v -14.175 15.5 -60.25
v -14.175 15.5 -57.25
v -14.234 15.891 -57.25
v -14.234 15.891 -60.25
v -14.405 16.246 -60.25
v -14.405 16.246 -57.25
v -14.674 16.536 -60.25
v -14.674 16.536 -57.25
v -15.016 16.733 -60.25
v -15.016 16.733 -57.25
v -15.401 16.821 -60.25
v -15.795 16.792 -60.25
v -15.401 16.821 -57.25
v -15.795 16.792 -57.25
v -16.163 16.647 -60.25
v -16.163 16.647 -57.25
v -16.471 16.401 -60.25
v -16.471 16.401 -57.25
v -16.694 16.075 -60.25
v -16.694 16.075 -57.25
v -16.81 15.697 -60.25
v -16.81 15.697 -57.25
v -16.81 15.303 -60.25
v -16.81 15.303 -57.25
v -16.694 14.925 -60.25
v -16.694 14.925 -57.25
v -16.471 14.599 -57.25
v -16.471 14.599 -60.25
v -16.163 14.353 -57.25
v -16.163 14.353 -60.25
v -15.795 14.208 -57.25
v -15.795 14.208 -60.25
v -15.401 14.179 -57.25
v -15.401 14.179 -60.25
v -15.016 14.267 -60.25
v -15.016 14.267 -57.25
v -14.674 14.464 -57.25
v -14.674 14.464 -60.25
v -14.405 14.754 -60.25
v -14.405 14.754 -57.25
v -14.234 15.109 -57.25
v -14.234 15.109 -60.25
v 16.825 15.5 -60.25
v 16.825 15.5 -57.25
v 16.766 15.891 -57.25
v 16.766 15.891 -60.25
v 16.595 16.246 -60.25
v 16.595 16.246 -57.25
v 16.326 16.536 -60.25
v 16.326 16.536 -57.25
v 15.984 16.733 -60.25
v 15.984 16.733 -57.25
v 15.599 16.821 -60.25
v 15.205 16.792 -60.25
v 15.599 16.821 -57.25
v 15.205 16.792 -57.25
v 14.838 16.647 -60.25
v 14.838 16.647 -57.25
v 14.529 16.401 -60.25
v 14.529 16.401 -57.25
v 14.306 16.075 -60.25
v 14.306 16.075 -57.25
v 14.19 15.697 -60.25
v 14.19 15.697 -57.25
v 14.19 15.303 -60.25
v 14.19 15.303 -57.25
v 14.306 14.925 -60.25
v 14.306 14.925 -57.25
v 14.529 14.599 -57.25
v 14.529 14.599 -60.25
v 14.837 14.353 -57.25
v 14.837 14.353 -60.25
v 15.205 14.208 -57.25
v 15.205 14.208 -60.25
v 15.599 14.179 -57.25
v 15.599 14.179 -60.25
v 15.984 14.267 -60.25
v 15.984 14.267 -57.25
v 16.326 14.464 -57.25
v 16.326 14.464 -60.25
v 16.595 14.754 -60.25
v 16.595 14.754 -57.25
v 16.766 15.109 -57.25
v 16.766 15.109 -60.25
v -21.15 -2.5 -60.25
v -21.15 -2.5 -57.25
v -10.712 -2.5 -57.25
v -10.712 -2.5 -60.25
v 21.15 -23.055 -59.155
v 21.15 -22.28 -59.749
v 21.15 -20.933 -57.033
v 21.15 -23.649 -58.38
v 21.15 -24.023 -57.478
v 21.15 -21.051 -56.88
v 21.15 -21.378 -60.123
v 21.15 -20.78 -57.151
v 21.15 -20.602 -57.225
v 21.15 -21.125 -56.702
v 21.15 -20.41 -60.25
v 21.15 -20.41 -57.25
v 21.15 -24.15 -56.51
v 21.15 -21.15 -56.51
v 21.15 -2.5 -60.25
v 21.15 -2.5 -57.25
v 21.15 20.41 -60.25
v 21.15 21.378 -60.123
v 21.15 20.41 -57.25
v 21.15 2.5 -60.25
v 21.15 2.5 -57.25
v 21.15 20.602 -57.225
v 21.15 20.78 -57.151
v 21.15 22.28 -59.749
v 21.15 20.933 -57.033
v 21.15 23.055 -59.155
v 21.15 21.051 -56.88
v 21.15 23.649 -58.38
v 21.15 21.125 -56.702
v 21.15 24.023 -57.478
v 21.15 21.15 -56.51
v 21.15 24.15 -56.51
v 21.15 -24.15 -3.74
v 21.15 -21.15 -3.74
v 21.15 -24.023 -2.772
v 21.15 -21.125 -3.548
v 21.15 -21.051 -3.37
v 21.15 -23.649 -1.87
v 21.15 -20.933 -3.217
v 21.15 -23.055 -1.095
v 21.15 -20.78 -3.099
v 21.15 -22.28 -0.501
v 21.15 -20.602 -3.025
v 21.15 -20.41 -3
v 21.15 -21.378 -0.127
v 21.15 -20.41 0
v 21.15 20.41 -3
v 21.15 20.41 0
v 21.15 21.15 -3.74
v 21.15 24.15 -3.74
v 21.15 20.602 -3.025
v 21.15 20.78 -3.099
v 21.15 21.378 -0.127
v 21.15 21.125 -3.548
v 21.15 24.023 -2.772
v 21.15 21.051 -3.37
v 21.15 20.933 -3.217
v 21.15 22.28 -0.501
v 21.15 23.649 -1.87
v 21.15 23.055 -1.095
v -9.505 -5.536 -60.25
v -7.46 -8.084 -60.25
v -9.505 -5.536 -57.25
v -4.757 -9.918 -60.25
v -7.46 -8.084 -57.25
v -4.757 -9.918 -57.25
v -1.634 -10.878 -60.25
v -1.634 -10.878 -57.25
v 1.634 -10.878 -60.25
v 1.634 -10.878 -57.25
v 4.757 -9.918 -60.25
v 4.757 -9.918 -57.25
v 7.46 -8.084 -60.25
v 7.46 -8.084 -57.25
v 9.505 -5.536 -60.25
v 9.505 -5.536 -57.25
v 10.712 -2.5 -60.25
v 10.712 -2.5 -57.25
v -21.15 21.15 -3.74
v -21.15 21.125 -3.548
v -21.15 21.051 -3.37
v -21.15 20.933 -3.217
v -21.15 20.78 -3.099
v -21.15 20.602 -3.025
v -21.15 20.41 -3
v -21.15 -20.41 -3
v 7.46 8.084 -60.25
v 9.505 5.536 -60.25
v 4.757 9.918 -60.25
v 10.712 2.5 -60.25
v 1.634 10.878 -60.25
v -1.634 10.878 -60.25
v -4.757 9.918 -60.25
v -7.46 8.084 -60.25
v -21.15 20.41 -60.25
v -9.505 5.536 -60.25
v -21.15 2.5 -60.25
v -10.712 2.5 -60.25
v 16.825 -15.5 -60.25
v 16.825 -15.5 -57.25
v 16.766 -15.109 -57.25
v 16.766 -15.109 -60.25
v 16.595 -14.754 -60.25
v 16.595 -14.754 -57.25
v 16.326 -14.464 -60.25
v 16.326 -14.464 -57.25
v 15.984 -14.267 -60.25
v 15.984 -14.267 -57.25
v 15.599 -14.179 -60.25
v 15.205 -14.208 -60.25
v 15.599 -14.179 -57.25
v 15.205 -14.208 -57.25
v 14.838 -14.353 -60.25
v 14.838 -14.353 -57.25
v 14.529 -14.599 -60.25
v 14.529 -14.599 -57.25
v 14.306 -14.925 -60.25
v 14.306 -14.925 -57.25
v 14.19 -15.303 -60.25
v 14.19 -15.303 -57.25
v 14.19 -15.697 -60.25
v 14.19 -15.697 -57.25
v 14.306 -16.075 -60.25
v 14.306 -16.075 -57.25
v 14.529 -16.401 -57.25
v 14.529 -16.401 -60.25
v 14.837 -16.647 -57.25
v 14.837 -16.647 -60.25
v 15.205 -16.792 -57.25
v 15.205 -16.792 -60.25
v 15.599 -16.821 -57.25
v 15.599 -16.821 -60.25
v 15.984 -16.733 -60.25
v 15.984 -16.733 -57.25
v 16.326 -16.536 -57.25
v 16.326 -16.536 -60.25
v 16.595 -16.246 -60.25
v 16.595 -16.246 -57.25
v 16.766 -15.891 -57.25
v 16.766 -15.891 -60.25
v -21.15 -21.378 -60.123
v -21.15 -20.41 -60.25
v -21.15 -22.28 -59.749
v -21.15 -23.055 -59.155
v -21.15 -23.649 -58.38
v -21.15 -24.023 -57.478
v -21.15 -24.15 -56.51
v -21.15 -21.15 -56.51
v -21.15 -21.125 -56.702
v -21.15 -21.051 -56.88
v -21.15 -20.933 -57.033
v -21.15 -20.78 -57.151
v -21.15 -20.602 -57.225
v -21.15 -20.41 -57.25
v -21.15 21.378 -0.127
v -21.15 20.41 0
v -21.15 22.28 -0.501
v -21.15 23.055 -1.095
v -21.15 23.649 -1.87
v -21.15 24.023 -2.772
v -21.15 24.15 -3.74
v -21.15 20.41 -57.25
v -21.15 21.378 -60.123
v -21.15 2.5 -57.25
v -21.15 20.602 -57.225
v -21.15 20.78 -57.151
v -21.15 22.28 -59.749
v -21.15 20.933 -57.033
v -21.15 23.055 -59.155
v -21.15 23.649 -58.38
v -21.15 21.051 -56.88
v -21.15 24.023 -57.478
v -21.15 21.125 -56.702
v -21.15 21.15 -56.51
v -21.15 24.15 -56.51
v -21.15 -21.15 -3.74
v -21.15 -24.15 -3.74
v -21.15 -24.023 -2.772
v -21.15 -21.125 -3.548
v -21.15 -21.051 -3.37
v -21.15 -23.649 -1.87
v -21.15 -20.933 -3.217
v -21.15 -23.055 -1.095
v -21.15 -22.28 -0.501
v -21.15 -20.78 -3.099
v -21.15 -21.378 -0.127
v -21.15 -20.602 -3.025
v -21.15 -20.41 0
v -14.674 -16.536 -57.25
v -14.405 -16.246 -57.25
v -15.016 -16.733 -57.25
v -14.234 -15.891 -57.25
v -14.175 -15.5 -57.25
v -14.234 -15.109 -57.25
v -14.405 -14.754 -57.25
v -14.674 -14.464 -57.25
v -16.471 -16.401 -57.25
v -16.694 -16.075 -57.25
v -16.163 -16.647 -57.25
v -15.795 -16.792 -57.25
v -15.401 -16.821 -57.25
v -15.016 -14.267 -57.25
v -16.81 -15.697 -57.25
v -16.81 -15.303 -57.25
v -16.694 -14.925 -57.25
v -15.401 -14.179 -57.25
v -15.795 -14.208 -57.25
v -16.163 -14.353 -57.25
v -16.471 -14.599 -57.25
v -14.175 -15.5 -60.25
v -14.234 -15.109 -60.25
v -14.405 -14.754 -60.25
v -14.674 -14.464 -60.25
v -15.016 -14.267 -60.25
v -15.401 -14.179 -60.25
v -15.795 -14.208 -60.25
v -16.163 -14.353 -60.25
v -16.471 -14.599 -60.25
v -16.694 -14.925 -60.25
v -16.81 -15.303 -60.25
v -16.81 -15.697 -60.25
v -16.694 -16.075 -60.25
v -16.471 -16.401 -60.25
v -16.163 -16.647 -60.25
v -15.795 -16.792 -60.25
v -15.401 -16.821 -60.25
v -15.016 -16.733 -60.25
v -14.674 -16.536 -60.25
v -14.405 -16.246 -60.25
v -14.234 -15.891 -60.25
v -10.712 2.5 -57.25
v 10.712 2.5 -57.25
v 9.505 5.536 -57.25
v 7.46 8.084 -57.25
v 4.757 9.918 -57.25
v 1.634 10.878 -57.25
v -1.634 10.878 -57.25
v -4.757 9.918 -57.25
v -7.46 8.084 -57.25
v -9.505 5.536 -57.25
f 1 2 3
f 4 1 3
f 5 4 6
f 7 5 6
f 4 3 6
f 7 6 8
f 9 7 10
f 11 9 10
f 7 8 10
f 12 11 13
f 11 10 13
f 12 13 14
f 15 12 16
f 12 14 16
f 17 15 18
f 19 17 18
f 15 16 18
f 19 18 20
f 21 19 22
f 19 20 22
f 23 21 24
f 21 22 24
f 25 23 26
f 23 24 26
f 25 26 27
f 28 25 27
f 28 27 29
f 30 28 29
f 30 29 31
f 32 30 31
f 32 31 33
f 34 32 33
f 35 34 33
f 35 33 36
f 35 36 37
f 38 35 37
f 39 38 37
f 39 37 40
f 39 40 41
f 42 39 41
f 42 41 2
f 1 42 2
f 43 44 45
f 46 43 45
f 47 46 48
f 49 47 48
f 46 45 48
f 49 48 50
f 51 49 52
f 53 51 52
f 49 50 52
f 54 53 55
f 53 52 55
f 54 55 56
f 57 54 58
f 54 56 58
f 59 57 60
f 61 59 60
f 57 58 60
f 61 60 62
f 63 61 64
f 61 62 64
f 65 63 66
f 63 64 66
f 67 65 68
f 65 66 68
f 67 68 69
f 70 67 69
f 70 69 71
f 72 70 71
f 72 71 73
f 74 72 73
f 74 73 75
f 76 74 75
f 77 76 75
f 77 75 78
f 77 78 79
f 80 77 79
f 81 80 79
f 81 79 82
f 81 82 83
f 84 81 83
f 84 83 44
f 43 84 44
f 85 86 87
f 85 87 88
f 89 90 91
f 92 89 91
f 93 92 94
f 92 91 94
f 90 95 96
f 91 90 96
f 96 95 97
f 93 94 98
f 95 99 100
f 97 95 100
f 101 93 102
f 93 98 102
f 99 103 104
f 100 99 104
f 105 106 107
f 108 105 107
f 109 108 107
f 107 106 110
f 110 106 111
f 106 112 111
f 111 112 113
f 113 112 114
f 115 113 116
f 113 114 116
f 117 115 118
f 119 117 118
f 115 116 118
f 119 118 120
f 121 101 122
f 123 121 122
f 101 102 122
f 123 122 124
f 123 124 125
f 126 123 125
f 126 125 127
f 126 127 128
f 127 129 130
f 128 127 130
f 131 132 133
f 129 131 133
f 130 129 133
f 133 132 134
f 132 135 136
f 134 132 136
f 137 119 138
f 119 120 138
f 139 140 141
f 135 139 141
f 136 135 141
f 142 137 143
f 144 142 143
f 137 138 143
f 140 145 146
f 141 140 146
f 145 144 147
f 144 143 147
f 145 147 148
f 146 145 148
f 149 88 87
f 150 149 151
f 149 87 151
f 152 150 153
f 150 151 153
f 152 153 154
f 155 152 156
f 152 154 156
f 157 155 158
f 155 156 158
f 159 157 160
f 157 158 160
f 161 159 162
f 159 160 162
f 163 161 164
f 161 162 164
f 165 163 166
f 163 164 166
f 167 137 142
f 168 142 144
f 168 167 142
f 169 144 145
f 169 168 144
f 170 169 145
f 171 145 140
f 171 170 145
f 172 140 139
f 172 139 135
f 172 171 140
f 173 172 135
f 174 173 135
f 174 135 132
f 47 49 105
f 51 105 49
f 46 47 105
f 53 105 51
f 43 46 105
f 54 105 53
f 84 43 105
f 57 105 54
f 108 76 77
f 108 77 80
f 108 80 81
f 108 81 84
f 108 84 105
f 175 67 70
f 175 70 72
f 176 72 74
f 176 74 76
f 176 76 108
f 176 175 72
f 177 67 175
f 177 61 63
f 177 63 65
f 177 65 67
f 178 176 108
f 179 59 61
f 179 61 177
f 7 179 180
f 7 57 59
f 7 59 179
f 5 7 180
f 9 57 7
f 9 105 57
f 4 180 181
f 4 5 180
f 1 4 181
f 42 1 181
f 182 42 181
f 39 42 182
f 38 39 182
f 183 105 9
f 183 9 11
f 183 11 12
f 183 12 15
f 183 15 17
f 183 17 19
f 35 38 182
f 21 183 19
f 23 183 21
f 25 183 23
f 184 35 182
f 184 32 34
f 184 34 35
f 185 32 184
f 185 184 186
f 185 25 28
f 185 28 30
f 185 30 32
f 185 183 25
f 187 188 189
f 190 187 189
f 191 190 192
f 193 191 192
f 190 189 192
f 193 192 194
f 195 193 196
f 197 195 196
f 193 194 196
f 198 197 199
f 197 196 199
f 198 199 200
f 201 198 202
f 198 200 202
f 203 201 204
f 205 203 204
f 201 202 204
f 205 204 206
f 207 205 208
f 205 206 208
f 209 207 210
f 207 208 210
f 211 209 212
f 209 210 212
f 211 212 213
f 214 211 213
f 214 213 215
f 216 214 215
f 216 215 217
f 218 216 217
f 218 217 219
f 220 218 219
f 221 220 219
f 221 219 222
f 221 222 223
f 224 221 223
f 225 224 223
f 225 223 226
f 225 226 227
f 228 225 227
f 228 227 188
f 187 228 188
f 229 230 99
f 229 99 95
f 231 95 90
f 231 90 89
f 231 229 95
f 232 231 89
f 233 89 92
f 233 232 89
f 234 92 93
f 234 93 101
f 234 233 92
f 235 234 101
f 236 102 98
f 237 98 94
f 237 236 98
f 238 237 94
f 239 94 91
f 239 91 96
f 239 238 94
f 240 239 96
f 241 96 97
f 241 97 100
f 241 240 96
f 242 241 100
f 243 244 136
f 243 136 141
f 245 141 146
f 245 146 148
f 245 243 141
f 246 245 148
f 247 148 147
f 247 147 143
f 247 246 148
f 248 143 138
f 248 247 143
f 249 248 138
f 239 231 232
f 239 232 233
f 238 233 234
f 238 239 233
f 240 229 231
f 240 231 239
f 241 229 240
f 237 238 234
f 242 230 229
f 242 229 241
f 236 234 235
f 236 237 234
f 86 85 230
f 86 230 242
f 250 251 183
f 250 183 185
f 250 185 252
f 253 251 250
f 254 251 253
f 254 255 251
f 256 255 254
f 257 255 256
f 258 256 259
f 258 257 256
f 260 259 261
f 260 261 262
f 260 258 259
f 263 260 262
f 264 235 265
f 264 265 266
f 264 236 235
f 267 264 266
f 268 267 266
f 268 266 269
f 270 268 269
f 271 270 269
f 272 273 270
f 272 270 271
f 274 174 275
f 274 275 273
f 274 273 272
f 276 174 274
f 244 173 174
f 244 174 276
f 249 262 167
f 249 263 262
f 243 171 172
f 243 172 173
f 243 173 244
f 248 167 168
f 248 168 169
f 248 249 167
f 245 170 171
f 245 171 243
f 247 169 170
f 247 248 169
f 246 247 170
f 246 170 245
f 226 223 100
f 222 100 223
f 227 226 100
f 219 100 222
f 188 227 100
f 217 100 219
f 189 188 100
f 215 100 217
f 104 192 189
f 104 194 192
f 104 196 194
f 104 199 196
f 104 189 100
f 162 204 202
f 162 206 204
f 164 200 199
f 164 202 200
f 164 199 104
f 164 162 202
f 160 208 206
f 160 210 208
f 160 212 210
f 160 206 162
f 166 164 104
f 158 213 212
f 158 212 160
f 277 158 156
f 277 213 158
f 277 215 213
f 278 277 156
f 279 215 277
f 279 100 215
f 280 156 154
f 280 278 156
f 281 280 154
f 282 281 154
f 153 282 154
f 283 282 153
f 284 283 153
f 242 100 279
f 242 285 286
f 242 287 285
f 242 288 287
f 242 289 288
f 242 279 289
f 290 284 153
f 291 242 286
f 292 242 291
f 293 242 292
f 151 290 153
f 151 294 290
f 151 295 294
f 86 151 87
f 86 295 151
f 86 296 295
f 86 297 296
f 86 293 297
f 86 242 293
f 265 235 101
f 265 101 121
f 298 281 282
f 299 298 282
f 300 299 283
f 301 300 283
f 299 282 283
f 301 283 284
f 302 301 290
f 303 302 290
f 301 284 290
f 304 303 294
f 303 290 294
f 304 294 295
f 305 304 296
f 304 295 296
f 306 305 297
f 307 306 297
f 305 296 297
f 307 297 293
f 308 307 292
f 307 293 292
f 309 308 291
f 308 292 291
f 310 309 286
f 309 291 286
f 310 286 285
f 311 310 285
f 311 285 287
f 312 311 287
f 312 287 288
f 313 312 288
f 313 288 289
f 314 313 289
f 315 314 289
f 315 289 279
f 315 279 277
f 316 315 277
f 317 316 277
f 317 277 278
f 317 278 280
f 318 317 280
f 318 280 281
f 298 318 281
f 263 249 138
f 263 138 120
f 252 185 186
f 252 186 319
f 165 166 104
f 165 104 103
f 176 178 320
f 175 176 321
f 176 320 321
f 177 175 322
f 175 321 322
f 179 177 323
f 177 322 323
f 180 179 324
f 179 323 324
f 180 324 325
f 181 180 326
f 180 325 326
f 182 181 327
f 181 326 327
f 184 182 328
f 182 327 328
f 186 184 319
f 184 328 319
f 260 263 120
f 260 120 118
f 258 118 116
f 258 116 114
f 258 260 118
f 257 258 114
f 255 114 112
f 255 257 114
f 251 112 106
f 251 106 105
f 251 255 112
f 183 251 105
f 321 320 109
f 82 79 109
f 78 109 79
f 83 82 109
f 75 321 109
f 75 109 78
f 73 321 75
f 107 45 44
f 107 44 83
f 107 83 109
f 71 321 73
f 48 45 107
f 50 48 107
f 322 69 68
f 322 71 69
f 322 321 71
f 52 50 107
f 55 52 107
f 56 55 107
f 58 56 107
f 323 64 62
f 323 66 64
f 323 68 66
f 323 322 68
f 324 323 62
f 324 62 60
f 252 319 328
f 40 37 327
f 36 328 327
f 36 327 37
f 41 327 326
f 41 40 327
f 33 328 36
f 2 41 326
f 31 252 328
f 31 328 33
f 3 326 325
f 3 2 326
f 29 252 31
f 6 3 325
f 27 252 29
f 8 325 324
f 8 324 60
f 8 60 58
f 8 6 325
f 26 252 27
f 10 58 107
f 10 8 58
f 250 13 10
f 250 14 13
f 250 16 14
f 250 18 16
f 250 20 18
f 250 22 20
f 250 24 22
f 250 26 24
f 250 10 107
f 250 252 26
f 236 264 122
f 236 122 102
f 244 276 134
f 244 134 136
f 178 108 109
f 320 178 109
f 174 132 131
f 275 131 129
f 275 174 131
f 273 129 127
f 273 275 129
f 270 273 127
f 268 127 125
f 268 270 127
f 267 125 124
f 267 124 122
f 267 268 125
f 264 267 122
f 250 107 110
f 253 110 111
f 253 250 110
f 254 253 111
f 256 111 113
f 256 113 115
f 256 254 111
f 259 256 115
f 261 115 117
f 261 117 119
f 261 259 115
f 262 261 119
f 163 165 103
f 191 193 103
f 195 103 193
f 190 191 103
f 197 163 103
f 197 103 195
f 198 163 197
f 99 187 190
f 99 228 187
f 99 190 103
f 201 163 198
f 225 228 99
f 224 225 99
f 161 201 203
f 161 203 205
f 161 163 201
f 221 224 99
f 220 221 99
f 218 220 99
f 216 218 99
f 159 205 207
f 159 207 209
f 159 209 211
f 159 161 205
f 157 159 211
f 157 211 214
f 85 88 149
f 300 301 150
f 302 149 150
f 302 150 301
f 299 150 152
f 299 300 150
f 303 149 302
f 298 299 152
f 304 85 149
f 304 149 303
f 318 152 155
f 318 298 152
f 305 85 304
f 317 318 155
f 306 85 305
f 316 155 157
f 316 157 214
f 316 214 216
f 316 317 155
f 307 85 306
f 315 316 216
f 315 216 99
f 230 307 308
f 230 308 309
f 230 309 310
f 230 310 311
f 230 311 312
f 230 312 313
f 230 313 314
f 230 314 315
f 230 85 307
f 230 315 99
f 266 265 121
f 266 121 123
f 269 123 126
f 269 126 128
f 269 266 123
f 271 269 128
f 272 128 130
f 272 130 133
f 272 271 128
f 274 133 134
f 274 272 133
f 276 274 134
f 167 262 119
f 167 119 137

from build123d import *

# Parameters (mm, degrees)
SM_START               = -21.15
SM_BASE_FLANGE_2_DEPTH = 42.3
SKETCH_11_R            = 1.325
SKETCH_11_R_2          = 11
CUT_EXTRUDE_1_DEPTH    = 66.636175239


# Sheet-metal steps are written as plain solids
with BuildPart() as part:
    # Эскиз6 → Базовая кромка2 (new body)
    with BuildSketch(Plane(origin=(0, 0, 0), x_dir=(0, 0, -1), z_dir=(1, 0, 0)).offset(SM_START)):
        with BuildLine():
            Line((57.25, 2.5), (57.25, 20.41))
            ThreePointArc((57.25, 20.41), (57.033259018, 20.933259018), (56.51, 21.15))
            Line((56.51, 21.15), (3.74, 21.15))
            ThreePointArc((3.74, 21.15), (3.216740982, 20.933259018), (3, 20.41))
            Line((3, 20.41), (3, -20.41))
            ThreePointArc((3, -20.41), (3.216740982, -20.933259018), (3.74, -21.15))
            Line((3.74, -21.15), (56.51, -21.15))
            ThreePointArc((56.51, -21.15), (57.033259018, -20.933259018), (57.25, -20.41))
            Line((57.25, -20.41), (57.25, -2.5))
            Line((57.25, -2.5), (60.25, -2.5))
            Line((60.25, -2.5), (60.25, -20.41))
            ThreePointArc((60.25, -20.41), (59.154579362, -23.054579362), (56.51, -24.15))
            Line((56.51, -24.15), (3.74, -24.15))
            ThreePointArc((3.74, -24.15), (1.095420638, -23.054579362), (0, -20.41))
            Line((0, -20.41), (0, 20.41))
            ThreePointArc((0, 20.41), (1.095420638, 23.054579362), (3.74, 24.15))
            Line((3.74, 24.15), (56.51, 24.15))
            ThreePointArc((56.51, 24.15), (59.154579362, 23.054579362), (60.25, 20.41))
            Line((60.25, 20.41), (60.25, 2.5))
            Line((60.25, 2.5), (57.25, 2.5))
        make_face()
    extrude(amount=SM_BASE_FLANGE_2_DEPTH)

    # Эскиз11 → Вырез-Вытянуть1 (cut, through all)
    with BuildSketch(Plane.XY.offset(-57.25)):
        with Locations((-15.5, 15.5)):
            Circle(SKETCH_11_R)
        with Locations((15.5, 15.5)):
            Circle(SKETCH_11_R)
        with Locations((15.5, -15.5)):
            Circle(SKETCH_11_R)
        Circle(SKETCH_11_R_2)
        with Locations((-15.5, -15.5)):
            Circle(SKETCH_11_R)
    extrude(amount=-CUT_EXTRUDE_1_DEPTH, mode=Mode.SUBTRACT)


solid = part.part
